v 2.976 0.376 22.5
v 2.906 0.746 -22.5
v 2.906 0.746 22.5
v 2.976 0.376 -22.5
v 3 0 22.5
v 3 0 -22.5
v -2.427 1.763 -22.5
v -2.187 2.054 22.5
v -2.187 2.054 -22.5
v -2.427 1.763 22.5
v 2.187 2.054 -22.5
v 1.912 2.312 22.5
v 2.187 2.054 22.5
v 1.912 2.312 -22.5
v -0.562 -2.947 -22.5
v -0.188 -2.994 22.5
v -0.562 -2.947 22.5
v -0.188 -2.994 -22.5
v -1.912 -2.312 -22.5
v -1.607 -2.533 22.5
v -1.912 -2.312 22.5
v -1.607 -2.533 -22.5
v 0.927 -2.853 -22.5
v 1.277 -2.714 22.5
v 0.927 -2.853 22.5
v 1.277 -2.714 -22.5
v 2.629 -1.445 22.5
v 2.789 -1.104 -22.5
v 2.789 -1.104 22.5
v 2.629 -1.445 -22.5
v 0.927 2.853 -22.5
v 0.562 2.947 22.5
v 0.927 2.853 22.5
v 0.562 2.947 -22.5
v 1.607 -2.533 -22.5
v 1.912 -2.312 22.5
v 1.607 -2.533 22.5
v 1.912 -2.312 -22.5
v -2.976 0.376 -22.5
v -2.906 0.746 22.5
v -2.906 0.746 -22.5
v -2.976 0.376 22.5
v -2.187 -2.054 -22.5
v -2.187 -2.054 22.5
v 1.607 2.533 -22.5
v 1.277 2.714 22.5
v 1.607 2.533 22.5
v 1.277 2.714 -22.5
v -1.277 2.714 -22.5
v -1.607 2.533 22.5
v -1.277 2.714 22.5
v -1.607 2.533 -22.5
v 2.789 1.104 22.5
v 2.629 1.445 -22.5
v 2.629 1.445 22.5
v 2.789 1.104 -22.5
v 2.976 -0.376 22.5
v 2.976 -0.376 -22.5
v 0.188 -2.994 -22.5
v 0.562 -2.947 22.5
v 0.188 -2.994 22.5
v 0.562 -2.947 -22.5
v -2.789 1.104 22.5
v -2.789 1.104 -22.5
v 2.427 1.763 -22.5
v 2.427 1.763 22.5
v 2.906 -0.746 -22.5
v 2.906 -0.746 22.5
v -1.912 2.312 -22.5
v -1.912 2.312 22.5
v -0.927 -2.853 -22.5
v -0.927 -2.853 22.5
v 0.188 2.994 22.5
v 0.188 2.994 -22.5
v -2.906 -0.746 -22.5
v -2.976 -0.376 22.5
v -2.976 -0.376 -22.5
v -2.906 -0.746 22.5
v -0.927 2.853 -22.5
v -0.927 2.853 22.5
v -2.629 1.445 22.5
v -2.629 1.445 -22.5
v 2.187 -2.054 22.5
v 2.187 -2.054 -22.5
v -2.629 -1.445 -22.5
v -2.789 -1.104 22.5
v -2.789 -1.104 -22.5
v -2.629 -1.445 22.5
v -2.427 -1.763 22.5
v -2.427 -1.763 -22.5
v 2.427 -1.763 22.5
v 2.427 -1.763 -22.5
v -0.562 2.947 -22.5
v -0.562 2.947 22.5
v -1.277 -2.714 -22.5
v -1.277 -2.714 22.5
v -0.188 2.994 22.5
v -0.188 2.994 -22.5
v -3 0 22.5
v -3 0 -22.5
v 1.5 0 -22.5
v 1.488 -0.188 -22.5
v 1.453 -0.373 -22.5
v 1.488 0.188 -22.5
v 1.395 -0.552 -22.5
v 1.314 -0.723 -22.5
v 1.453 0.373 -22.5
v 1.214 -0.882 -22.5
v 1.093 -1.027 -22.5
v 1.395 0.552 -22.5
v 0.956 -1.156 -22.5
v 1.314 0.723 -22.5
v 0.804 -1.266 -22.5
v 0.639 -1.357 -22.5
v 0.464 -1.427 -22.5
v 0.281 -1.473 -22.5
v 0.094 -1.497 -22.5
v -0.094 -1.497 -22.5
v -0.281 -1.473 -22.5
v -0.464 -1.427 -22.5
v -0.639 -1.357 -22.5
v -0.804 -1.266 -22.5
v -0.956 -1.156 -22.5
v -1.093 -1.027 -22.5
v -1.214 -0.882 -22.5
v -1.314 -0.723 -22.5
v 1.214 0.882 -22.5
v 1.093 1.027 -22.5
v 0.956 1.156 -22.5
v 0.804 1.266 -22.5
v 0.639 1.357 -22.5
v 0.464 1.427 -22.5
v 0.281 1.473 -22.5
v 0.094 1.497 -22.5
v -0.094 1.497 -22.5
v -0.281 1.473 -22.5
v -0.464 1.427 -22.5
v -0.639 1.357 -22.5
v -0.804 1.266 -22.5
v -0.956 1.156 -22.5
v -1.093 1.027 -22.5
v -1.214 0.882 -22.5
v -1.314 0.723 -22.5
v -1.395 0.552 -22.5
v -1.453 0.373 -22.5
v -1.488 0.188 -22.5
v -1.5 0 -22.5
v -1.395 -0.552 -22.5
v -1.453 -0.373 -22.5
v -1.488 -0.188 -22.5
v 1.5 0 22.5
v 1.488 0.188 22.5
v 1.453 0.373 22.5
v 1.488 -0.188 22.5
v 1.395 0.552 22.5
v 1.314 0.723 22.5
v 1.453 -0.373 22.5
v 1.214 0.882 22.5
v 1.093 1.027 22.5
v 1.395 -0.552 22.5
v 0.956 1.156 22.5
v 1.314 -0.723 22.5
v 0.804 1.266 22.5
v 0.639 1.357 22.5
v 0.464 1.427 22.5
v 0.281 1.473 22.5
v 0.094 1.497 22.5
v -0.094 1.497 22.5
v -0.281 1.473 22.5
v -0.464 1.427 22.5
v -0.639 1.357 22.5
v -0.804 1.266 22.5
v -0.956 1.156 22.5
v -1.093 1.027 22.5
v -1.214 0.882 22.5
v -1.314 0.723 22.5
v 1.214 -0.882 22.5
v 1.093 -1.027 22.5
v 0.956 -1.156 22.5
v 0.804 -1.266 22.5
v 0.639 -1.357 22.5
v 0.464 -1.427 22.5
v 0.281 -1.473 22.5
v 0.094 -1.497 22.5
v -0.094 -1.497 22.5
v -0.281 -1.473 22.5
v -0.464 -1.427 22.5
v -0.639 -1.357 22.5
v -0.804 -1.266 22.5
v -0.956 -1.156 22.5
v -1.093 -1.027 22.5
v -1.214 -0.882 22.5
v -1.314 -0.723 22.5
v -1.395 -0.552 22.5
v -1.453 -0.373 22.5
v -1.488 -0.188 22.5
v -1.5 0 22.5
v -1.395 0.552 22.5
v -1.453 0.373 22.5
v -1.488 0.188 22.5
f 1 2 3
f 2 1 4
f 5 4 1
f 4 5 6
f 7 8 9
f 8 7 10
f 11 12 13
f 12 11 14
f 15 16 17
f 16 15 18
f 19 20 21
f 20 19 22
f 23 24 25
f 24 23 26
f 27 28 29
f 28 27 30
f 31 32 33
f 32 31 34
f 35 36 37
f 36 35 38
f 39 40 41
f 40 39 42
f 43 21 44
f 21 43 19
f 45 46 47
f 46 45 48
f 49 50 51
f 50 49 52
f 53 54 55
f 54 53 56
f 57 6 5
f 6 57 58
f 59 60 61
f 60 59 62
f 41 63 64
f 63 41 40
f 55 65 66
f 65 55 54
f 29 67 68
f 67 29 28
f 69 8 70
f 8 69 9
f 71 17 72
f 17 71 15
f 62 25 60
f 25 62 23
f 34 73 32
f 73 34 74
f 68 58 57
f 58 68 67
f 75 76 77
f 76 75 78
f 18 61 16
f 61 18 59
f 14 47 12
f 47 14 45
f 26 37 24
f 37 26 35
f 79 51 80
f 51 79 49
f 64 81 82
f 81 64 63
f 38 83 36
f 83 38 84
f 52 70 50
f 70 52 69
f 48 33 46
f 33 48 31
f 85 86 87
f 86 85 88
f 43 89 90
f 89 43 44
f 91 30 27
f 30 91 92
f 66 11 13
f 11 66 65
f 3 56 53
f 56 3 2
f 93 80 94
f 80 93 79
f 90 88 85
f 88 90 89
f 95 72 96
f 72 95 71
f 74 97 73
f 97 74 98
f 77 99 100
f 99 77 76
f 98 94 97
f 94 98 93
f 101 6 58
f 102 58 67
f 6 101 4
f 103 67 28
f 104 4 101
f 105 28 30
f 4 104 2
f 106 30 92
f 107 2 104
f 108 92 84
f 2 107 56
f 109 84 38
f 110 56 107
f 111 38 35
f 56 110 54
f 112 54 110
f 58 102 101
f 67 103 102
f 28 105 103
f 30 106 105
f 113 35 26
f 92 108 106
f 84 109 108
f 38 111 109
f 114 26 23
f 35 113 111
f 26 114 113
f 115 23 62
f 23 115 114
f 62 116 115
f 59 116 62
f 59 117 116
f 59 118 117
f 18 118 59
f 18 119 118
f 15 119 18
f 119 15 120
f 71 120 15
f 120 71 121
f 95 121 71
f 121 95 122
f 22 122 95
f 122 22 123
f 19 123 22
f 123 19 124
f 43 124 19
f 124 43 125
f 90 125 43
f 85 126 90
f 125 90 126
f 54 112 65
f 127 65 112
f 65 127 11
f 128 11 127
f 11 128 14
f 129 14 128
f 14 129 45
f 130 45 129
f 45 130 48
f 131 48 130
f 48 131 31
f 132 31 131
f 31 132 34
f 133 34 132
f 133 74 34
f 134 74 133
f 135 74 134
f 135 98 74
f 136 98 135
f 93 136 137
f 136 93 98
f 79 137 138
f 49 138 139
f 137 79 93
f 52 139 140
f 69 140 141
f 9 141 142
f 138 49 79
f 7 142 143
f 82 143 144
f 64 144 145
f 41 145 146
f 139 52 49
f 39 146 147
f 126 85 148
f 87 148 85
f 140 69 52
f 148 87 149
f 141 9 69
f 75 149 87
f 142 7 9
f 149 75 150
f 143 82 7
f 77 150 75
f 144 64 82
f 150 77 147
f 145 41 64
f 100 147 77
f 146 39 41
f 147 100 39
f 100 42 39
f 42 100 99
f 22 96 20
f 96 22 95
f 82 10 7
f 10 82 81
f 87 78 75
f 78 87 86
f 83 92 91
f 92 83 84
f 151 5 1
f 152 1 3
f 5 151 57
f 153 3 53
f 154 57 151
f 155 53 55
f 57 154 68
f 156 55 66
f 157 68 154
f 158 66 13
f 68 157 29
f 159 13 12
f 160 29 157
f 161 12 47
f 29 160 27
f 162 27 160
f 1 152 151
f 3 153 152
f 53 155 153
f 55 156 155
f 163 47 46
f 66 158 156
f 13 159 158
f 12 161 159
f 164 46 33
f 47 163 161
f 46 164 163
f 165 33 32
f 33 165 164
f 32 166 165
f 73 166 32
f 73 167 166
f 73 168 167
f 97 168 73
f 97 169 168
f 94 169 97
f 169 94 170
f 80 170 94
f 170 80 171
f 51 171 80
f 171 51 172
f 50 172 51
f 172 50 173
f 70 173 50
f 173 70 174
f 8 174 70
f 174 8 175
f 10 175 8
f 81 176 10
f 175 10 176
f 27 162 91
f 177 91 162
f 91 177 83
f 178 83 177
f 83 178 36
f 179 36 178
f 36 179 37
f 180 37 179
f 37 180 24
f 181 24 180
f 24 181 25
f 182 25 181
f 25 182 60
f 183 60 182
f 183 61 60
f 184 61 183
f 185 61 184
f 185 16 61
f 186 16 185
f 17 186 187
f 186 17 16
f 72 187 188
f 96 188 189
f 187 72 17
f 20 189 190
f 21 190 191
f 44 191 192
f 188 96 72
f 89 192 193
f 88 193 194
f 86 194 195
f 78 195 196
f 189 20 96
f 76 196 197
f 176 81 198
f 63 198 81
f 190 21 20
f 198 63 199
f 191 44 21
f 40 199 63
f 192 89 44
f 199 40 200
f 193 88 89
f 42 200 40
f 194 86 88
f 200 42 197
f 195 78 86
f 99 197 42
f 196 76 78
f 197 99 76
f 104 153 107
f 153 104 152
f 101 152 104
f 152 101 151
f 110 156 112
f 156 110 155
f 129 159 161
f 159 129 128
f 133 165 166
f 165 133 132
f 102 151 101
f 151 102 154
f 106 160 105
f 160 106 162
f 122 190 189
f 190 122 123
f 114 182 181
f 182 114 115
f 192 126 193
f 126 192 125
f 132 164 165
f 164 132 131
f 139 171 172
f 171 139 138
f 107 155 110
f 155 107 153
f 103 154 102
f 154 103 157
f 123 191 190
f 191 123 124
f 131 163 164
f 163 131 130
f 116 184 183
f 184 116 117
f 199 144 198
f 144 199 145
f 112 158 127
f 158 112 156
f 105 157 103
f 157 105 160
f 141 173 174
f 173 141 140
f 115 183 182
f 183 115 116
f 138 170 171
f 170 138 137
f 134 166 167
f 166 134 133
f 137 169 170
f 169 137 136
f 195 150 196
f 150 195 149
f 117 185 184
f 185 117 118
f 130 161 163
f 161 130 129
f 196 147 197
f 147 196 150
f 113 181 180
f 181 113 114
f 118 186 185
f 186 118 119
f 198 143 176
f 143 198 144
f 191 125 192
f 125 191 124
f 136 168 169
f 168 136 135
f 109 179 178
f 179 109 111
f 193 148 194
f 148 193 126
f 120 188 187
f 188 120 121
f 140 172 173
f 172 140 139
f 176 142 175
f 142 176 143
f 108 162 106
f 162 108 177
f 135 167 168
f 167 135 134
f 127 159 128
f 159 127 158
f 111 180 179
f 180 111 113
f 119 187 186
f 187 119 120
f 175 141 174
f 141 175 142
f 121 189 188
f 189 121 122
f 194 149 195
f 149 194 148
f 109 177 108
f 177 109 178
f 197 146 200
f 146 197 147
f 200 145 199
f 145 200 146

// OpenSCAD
$fn = 50;


difference() {
	union() {
		translate(v = [0, 0, -22.5000000000]) {
			cylinder(h = 45, r = 3.0000000000);
		}
	}
	union() {
		translate(v = [0, 0, -100.0000000000]) {
			cylinder(h = 200, r = 1.5000000000);
		}
	}
}
